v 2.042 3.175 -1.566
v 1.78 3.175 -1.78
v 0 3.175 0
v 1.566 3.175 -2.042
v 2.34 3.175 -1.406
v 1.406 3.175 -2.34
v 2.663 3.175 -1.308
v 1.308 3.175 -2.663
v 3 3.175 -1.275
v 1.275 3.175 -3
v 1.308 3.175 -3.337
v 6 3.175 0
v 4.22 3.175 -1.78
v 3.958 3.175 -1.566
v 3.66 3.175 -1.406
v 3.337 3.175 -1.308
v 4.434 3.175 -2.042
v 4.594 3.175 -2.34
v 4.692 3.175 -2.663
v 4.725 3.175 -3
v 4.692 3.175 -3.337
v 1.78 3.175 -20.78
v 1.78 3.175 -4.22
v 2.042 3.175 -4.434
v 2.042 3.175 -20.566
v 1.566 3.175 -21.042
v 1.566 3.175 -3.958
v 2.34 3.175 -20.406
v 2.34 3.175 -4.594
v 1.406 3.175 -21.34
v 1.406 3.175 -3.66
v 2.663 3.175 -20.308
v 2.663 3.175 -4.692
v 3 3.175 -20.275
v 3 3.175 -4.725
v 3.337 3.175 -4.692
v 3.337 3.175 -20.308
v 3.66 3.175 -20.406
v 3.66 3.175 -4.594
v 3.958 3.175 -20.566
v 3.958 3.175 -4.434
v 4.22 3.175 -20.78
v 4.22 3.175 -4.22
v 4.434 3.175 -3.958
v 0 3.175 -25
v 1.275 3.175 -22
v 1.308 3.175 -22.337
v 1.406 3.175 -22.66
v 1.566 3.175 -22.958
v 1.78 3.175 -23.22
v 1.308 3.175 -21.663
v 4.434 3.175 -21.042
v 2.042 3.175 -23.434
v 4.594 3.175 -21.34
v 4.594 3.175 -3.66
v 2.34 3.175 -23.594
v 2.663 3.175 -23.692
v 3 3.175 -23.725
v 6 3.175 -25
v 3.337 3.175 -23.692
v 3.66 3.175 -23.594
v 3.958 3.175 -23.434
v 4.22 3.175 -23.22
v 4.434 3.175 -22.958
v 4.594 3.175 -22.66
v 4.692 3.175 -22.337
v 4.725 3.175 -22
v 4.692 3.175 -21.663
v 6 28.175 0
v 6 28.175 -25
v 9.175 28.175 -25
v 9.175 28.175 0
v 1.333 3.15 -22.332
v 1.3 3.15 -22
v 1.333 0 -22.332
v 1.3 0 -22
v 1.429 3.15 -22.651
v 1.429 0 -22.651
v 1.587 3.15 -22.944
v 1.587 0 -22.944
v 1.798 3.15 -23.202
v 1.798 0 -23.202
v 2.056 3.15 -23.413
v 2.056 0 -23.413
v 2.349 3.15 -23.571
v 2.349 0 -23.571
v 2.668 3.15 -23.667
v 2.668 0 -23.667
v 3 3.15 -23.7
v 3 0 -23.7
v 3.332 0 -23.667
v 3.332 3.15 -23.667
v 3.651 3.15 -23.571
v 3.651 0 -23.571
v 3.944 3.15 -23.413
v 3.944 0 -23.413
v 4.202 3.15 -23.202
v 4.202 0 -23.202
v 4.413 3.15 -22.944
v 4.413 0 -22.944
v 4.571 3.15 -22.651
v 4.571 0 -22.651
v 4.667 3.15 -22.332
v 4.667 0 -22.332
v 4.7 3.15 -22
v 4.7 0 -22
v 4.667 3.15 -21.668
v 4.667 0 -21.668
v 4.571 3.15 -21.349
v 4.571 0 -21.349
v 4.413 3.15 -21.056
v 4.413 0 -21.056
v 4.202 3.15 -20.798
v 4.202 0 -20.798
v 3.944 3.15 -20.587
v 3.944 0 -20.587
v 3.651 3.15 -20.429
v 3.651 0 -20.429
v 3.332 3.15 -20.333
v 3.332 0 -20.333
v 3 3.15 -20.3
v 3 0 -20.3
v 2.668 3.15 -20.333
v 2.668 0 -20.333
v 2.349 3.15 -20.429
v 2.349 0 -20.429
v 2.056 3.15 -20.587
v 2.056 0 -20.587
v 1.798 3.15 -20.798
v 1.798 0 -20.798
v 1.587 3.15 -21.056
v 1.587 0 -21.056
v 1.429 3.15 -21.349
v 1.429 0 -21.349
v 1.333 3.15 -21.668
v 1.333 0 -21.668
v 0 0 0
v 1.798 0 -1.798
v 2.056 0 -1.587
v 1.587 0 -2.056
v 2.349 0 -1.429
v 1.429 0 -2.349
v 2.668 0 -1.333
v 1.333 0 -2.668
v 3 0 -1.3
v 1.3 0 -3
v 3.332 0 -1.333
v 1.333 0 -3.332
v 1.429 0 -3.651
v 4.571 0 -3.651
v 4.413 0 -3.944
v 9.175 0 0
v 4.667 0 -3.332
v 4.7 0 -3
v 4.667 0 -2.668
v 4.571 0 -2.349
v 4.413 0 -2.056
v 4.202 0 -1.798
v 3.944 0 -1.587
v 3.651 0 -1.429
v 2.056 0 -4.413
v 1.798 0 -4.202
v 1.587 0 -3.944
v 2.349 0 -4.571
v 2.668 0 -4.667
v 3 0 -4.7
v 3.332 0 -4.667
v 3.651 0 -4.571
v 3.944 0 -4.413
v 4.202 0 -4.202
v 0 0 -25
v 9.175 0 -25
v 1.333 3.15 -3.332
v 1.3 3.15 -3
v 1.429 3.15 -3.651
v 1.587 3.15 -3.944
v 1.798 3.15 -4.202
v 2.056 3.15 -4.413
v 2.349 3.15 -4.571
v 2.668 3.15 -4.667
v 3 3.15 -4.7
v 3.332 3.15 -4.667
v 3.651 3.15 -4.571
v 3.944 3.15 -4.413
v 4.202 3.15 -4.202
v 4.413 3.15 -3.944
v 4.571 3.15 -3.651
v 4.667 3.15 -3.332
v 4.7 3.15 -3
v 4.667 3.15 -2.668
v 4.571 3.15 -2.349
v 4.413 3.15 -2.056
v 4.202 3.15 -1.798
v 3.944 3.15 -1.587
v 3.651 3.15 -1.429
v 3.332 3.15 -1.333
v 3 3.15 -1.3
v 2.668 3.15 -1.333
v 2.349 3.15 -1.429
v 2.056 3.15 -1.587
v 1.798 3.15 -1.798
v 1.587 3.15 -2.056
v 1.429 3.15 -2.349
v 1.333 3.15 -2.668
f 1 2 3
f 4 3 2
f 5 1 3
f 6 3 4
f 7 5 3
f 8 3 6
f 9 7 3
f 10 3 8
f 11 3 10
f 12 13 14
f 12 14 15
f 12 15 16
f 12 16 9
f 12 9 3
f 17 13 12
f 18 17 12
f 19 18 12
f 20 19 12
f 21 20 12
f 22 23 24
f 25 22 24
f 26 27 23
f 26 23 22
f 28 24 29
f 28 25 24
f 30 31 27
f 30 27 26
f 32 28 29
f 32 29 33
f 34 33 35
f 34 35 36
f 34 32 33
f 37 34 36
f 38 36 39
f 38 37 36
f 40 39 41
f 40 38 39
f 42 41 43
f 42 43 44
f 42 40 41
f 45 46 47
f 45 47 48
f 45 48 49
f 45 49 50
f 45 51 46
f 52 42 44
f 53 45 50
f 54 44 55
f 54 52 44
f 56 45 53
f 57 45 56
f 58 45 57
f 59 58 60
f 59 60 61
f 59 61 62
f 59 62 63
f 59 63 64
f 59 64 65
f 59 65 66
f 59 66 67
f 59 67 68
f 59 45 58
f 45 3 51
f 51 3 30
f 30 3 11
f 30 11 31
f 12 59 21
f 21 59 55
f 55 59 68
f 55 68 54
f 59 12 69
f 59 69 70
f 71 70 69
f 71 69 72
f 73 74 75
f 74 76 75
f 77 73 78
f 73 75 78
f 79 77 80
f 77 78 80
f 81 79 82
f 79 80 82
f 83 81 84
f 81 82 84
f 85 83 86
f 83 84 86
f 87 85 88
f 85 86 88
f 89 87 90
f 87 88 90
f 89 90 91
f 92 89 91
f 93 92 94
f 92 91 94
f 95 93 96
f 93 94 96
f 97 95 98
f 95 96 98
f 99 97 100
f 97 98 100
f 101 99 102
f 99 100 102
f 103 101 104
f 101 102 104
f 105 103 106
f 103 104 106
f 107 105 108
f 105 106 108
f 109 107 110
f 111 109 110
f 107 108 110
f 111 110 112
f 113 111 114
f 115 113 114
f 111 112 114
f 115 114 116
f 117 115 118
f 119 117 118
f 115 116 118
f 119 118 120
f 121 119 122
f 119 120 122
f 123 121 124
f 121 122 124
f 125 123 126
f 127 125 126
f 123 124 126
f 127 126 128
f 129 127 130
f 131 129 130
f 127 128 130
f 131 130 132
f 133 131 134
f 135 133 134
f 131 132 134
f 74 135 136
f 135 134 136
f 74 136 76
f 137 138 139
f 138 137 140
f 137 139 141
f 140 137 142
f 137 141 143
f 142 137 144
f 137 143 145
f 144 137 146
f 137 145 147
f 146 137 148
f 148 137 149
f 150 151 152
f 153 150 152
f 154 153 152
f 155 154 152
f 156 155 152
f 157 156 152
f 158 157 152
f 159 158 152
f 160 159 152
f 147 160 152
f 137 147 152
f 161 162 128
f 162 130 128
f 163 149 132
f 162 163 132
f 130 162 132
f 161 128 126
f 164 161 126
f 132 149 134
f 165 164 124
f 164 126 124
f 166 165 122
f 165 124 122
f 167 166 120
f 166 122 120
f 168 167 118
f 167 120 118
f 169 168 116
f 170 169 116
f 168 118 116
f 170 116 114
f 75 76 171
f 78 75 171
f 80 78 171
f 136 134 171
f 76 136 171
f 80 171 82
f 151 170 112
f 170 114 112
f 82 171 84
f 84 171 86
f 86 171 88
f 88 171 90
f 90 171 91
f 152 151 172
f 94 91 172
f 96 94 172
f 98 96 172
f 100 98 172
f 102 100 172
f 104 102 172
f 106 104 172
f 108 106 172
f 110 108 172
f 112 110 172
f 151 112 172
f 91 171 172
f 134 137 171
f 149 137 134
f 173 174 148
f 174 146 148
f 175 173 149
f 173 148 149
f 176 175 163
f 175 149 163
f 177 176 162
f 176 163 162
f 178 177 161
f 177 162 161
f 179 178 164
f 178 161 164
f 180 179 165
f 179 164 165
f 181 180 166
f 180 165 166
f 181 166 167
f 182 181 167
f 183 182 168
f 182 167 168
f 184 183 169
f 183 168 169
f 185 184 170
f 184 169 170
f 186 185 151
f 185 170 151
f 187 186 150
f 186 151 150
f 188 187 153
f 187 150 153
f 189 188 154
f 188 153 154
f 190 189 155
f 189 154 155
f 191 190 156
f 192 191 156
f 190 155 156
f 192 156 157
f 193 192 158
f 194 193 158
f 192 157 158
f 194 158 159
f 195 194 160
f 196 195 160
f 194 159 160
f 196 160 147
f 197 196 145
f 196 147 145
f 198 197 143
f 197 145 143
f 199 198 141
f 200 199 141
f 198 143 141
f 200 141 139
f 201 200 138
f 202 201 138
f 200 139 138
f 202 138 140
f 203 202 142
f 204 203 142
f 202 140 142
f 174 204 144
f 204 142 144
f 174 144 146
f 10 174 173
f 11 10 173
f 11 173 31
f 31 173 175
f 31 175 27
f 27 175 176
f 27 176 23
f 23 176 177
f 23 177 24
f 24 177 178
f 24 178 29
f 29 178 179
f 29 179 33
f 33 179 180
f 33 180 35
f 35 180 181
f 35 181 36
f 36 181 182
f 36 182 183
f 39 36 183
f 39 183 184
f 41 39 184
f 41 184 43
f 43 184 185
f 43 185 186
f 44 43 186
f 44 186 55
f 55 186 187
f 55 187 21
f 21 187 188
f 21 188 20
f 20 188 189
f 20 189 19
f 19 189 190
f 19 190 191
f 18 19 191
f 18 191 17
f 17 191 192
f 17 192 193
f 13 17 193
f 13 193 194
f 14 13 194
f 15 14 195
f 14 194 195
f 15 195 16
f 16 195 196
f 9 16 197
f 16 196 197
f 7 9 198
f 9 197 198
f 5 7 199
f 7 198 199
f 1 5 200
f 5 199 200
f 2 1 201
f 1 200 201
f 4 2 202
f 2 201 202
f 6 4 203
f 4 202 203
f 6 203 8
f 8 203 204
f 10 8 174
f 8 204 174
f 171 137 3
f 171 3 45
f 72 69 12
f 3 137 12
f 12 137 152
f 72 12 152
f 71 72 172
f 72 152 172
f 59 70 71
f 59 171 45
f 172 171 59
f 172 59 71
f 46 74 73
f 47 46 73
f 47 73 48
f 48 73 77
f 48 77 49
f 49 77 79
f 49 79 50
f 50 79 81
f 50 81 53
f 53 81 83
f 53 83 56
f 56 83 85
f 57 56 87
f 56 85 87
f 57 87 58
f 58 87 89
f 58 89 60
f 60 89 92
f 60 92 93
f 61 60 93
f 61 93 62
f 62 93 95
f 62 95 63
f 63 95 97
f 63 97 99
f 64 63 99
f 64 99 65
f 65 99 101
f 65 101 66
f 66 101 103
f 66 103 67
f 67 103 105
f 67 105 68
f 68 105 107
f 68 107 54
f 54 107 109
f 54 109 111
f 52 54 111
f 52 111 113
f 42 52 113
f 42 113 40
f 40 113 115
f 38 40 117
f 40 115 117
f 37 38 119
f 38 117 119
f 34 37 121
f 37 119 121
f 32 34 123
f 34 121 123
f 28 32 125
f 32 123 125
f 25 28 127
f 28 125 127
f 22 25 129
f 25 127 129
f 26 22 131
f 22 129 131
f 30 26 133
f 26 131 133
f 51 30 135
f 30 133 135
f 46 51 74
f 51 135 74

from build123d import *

# Parameters (mm, degrees)
SKETCH1_W                      = 9.175
SKETCH1_H                      = 25
BOSS_EXTRUDE1_DEPTH            = 3.175
SKETCH2_W                      = 3.175
SKETCH2_H                      = 25
BOSS_EXTRUDE2_DEPTH            = 25
M3_CLEARANCE_HOLE1_D           = 3.4
M3_CLEARANCE_HOLE1_CSINK_D     = 3.45
M3_CLEARANCE_HOLE1_CSINK_ANGLE = 90


with BuildPart() as part:
    # Sketch1 → Boss-Extrude1 (new body)
    with BuildSketch(Plane(origin=(0, 0, 0), x_dir=(1, 0, 0), z_dir=(0, 1, 0))):
        with Locations((4.5875, 12.5)):
            Rectangle(SKETCH1_W, SKETCH1_H)
    extrude(amount=BOSS_EXTRUDE1_DEPTH)

    # Sketch2 → Boss-Extrude2 (add)
    with BuildSketch(Plane(origin=(0, 3.175, 0), x_dir=(1, 0, 0), z_dir=(0, 1, 0))):
        with Locations((7.5875, 12.5)):
            Rectangle(SKETCH2_W, SKETCH2_H)
    extrude(amount=BOSS_EXTRUDE2_DEPTH)

    # M3 Clearance Hole1 (through all)
    with Locations(Plane(origin=(0, 3.175, 0), x_dir=(1, 0, 0), z_dir=(0, 1, 0))):
        with Locations((3, 22), (3, 3)):
            CounterSinkHole(M3_CLEARANCE_HOLE1_D / 2, M3_CLEARANCE_HOLE1_CSINK_D / 2, counter_sink_angle=M3_CLEARANCE_HOLE1_CSINK_ANGLE)


solid = part.part
